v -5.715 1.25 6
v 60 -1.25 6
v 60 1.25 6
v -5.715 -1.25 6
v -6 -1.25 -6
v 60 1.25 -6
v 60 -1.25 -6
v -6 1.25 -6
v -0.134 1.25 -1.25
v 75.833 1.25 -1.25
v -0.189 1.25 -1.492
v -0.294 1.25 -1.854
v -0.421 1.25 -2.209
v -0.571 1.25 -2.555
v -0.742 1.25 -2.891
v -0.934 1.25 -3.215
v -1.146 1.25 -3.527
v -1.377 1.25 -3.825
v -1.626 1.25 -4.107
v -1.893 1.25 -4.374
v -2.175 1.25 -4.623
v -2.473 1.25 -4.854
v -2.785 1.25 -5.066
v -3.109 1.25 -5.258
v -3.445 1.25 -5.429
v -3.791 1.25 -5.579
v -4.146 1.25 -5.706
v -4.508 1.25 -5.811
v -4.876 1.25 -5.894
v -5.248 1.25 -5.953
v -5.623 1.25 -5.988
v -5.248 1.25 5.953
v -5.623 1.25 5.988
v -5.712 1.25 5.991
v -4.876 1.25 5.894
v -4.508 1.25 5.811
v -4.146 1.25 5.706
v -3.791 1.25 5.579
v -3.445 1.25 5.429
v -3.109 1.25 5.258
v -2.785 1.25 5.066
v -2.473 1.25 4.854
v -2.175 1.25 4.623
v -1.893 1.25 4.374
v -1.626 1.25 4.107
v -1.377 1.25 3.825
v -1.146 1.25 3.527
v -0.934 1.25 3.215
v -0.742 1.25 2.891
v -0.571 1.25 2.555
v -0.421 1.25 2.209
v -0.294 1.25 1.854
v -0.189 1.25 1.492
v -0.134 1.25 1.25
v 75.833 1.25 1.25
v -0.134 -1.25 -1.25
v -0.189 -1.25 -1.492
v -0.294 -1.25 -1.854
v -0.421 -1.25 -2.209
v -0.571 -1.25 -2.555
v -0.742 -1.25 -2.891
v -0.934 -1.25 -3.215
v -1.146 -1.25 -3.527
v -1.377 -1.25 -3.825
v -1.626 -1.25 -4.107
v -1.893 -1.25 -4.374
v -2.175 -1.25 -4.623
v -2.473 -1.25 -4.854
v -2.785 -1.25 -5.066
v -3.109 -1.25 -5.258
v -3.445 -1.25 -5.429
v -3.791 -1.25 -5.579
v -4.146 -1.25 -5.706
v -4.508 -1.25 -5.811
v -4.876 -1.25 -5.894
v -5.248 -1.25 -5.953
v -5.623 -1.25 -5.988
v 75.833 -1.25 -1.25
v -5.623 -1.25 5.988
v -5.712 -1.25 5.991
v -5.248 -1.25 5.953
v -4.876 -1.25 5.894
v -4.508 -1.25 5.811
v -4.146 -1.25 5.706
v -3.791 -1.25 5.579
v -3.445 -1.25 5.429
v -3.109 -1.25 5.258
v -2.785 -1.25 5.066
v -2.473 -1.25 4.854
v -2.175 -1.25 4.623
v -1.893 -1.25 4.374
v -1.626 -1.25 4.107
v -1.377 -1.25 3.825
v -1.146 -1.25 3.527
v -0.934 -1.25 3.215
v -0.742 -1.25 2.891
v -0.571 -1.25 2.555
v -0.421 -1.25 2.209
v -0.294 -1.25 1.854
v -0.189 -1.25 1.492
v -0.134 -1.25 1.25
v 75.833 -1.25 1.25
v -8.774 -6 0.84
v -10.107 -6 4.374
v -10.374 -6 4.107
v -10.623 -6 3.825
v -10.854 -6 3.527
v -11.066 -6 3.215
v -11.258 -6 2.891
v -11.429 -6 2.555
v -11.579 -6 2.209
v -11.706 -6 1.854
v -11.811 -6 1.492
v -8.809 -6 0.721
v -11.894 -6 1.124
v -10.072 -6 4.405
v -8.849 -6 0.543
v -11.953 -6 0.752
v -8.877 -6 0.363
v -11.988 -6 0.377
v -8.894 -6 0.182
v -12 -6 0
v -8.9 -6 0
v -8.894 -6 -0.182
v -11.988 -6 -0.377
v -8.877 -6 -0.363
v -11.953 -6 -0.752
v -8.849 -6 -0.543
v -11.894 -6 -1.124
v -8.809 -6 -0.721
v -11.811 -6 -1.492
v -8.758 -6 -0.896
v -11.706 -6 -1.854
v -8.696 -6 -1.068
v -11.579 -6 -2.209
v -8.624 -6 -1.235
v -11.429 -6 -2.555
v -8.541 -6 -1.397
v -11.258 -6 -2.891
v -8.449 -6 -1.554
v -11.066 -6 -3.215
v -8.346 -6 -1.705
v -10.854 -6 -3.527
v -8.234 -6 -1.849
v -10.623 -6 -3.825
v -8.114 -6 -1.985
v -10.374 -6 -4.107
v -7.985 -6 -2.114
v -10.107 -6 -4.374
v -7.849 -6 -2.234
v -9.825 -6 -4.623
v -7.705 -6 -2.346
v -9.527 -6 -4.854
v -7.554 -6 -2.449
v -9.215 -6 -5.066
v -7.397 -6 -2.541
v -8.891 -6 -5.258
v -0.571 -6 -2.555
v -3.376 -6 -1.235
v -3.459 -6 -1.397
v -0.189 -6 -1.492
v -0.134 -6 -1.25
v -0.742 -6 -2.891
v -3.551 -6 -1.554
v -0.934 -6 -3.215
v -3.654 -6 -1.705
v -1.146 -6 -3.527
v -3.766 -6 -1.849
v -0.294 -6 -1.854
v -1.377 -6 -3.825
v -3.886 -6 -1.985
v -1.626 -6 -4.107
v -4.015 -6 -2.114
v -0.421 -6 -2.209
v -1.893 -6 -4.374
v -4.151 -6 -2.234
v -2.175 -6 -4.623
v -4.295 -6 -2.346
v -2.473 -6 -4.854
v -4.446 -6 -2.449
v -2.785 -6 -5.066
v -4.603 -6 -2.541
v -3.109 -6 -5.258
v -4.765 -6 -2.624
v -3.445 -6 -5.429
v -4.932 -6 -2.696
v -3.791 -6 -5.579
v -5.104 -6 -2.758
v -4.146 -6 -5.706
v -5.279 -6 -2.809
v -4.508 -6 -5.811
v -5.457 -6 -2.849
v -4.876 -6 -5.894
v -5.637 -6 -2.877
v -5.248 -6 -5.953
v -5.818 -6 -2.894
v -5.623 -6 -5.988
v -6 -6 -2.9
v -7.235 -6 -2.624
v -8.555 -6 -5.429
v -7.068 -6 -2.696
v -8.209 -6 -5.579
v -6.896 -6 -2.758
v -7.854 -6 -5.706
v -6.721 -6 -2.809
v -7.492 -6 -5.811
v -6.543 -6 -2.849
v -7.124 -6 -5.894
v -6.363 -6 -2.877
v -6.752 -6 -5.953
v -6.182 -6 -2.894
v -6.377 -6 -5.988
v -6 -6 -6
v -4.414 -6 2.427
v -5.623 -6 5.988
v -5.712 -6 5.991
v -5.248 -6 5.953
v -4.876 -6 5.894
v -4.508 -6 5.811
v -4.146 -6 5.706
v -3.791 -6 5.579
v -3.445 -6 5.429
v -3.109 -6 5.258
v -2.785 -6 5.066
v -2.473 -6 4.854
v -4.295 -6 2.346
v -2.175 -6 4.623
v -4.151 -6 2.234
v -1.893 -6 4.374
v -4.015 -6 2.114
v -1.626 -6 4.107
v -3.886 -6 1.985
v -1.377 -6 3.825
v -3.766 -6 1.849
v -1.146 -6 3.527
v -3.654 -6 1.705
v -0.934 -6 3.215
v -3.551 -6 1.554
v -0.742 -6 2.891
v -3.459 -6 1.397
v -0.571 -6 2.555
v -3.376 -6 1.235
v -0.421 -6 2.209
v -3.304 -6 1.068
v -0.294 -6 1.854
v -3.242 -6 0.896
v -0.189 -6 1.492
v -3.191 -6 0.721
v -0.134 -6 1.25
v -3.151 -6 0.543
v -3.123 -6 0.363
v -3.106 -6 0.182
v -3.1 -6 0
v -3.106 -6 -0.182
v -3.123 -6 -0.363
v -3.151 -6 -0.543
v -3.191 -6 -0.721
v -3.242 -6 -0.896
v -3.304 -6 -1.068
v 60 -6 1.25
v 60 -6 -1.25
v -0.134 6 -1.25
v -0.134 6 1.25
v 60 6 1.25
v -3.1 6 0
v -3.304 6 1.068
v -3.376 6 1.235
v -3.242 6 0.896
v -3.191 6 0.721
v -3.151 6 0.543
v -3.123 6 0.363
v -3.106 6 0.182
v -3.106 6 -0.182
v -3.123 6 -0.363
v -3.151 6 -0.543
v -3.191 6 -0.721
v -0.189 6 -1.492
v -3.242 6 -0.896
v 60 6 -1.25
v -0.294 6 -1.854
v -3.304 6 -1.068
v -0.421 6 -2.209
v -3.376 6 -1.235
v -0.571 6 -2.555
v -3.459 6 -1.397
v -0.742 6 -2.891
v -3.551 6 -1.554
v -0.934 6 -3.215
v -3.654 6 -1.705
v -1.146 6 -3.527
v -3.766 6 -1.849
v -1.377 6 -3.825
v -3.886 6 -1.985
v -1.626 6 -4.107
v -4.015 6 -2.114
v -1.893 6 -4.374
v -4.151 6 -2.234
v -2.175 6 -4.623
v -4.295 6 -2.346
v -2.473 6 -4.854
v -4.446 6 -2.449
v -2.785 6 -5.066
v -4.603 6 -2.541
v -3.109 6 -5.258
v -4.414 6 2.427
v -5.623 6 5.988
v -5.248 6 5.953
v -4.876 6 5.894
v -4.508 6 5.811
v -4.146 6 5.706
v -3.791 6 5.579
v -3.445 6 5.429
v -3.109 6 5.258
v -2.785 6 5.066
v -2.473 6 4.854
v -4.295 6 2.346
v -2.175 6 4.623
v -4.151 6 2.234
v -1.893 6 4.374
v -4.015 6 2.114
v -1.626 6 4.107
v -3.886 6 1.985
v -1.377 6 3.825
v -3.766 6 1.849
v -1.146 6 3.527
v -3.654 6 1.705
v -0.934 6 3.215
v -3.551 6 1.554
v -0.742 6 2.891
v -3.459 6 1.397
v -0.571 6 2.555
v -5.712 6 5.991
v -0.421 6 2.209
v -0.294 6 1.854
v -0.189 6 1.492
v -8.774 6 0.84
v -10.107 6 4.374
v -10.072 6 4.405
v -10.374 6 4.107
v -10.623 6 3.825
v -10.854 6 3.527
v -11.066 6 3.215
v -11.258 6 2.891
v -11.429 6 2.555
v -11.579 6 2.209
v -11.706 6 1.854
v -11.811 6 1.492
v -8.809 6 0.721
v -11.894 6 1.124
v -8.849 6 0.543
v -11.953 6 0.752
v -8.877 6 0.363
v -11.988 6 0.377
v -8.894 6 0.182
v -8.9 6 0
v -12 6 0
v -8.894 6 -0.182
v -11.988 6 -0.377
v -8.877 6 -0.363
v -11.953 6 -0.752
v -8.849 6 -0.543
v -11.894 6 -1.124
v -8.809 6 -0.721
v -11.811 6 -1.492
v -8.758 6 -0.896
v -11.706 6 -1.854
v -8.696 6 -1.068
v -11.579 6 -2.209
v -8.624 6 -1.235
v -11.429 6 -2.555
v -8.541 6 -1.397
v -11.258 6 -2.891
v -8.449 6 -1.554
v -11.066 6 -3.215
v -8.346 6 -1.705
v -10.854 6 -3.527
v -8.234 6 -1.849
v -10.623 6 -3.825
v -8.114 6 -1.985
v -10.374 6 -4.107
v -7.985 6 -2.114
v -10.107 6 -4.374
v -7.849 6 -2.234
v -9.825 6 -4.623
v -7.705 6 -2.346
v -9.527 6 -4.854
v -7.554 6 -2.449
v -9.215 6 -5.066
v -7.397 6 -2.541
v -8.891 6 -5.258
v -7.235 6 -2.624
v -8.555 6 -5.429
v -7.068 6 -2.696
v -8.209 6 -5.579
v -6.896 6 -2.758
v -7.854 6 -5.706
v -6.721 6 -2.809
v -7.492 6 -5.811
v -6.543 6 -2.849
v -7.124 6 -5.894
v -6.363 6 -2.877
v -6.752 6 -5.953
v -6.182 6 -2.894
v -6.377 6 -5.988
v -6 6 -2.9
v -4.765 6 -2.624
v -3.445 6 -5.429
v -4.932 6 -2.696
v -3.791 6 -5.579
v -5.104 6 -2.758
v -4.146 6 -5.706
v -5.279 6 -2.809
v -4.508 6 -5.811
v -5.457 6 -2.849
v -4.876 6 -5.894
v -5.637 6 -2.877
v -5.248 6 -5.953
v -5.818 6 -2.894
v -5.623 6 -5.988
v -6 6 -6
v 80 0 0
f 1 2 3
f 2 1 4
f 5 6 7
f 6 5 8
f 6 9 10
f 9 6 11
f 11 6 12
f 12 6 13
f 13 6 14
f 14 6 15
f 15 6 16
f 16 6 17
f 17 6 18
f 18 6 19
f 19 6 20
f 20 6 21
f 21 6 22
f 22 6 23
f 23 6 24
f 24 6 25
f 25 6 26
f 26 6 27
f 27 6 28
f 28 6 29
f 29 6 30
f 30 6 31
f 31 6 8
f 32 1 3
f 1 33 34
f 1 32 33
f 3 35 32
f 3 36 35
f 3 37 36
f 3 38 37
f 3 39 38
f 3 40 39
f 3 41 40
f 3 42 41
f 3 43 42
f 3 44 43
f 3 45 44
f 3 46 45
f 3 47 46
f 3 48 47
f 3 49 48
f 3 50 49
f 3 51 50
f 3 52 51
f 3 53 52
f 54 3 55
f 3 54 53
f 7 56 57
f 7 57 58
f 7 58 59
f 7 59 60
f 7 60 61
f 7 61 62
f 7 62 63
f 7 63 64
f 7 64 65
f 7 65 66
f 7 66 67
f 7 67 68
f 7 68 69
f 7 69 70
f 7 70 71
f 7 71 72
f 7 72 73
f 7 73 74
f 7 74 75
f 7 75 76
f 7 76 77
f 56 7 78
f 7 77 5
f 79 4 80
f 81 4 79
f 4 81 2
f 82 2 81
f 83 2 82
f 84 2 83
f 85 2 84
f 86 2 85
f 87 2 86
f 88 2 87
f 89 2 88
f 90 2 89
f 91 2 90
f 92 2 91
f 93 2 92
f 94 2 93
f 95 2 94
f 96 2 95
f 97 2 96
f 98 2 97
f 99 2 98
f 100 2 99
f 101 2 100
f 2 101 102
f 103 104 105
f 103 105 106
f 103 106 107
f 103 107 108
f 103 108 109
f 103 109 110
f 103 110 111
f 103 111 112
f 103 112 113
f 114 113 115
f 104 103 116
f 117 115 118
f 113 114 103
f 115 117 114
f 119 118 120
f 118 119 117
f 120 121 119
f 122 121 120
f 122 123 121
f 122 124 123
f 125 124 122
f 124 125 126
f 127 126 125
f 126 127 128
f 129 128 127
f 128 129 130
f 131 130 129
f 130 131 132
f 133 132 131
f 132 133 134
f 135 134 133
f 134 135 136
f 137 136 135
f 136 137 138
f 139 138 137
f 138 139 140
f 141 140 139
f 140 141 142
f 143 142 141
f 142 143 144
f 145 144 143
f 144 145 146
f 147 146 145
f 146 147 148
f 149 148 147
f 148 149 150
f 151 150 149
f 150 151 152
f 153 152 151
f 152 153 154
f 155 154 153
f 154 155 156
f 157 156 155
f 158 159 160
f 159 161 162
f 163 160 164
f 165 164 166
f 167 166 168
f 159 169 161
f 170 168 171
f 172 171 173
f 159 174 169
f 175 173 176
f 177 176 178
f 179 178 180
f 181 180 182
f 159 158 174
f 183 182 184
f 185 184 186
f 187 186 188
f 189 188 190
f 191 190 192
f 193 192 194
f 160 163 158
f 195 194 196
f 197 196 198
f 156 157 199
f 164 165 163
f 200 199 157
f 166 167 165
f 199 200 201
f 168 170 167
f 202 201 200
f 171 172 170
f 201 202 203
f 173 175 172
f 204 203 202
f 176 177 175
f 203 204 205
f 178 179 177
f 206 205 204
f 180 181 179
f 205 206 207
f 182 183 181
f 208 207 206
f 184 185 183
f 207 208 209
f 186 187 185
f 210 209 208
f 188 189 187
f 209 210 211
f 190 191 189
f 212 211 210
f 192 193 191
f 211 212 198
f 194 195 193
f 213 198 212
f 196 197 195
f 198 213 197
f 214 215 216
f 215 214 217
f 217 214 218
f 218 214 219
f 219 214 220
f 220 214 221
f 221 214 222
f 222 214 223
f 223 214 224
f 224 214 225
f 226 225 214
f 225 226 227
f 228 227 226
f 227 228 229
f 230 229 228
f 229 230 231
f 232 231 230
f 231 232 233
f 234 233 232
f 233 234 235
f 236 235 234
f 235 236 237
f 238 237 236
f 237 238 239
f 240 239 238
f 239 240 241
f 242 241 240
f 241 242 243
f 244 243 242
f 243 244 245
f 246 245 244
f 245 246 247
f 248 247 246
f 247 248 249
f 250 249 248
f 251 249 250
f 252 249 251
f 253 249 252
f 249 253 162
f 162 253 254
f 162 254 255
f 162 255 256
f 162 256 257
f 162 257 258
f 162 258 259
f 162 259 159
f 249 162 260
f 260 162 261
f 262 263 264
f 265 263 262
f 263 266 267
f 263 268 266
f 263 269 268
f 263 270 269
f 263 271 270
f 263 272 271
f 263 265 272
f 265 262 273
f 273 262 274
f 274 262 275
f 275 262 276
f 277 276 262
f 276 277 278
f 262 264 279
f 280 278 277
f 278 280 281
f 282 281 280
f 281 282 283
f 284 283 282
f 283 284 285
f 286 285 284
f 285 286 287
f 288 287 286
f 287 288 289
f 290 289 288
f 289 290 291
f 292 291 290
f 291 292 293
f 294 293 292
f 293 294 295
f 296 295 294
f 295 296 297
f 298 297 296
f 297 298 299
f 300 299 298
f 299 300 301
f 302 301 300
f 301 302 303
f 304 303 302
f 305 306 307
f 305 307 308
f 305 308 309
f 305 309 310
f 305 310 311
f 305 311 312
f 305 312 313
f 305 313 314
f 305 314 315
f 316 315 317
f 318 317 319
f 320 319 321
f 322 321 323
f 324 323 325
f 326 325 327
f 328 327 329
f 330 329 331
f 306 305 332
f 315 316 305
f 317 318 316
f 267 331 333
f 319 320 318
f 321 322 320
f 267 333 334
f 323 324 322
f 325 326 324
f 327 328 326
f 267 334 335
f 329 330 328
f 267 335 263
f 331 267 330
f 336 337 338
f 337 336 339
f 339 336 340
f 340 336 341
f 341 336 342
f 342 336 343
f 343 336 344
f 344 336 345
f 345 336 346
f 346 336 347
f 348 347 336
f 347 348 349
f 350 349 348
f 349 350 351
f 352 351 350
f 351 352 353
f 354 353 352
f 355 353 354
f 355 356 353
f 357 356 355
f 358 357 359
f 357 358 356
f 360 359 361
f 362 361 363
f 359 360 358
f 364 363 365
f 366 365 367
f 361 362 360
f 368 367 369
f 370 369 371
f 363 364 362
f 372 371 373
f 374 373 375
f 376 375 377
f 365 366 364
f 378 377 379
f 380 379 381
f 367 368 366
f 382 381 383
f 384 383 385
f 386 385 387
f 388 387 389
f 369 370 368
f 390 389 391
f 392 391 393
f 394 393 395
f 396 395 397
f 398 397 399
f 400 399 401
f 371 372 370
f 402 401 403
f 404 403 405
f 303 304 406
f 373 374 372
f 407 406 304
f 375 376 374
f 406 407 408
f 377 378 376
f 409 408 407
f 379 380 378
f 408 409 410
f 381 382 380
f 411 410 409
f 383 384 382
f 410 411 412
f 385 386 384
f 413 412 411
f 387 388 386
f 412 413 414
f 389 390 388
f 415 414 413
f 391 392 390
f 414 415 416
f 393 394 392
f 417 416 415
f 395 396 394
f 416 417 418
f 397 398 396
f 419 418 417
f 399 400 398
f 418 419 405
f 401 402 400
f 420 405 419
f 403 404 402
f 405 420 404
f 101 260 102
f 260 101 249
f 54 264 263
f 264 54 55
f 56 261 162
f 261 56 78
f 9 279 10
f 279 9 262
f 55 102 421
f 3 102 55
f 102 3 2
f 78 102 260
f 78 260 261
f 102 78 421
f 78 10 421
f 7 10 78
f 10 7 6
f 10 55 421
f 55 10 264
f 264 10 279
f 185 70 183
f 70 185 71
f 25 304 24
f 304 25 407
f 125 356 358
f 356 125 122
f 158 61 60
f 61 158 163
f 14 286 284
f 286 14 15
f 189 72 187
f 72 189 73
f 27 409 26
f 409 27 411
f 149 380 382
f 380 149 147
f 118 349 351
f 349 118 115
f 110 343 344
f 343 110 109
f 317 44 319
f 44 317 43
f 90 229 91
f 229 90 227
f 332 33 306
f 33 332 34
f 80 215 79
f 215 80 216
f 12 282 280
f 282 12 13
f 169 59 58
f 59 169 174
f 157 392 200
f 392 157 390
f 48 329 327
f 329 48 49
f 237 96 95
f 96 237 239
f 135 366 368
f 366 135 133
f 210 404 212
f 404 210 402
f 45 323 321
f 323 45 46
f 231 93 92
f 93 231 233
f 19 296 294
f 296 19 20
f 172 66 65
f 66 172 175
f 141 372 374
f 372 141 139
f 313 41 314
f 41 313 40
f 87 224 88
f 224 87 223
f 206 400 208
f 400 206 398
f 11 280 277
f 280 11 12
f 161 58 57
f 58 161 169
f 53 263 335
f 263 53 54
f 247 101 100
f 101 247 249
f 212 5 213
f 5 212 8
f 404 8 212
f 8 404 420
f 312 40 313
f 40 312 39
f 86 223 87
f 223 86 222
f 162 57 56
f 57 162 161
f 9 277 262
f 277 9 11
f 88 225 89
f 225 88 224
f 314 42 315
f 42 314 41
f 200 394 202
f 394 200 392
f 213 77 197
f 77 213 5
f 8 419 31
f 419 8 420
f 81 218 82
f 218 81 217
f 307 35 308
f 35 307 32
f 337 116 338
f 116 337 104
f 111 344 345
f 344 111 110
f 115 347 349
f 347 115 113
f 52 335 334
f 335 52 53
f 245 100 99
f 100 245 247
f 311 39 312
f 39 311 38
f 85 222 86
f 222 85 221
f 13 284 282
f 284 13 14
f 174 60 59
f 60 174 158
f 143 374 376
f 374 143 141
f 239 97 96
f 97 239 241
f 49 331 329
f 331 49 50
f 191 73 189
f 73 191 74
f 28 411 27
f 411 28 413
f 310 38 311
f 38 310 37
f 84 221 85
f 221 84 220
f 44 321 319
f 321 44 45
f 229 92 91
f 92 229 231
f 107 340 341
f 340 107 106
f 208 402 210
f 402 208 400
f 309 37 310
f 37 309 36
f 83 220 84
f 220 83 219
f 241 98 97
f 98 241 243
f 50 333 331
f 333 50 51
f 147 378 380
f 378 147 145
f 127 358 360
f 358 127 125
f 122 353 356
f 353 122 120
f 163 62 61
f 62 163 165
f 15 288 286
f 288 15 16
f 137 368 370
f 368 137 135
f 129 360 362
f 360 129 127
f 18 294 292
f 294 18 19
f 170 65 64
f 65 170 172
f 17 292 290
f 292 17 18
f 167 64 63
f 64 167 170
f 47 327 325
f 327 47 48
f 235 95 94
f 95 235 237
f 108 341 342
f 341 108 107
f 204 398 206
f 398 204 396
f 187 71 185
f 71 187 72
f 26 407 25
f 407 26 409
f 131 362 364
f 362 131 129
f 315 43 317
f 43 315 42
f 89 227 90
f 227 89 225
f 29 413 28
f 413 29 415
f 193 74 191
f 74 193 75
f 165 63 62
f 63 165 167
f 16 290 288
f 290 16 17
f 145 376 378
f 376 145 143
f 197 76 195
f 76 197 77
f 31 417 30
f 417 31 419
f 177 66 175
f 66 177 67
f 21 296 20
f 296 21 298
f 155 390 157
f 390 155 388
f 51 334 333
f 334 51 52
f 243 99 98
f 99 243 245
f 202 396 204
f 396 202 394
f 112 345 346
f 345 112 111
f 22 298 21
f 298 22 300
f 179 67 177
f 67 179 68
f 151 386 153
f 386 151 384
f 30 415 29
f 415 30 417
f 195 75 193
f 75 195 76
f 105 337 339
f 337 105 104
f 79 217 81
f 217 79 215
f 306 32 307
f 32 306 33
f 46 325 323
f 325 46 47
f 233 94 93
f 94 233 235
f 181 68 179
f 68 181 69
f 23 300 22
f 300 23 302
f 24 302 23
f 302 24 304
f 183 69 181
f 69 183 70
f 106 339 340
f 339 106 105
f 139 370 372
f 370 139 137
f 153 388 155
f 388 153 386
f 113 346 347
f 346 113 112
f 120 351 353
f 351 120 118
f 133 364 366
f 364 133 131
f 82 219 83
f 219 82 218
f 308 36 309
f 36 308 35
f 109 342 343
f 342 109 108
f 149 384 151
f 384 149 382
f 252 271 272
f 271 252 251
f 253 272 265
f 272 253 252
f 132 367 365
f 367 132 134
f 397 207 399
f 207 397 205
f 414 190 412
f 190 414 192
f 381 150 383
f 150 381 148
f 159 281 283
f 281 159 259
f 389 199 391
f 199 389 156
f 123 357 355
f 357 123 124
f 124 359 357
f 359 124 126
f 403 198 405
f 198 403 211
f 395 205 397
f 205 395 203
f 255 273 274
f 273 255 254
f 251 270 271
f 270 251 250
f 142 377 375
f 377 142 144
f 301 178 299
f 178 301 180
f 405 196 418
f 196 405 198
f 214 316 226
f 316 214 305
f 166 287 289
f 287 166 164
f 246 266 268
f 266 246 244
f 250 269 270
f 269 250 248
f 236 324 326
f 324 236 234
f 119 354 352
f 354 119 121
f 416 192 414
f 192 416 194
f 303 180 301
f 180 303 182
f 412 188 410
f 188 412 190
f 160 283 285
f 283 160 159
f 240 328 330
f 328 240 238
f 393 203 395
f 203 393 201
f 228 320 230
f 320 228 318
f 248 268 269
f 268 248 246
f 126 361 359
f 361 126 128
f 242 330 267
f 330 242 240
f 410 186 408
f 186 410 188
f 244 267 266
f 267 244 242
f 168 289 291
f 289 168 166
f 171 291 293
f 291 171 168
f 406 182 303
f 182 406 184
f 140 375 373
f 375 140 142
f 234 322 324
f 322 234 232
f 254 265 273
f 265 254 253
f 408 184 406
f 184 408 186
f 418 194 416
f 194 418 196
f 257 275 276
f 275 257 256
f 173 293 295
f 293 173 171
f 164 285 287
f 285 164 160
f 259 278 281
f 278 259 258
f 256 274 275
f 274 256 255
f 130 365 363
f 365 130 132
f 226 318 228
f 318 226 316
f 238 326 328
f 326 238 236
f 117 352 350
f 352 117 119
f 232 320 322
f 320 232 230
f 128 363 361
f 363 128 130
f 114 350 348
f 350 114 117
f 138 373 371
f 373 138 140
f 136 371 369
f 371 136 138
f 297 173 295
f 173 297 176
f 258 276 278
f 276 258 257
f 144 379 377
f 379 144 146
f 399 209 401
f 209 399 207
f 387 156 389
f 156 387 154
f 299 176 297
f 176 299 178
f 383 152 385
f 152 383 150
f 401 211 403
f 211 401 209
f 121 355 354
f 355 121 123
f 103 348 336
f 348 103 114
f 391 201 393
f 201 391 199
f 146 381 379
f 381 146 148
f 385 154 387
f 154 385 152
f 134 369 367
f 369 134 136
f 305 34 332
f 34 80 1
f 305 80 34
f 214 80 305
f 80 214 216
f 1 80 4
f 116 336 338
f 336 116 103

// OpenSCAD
//
//  HoseClip.scad
//  flower-box-hose-system
//
//  Author: Marius Montebaur
//  montebaur.tech, github.com/montioo
//

// set this to a lower value (e.g. 30) while editing.
$fn = 100;


// A tip or spike to stick into soil. Coordinate origin is the top part.
// @param overhang: How far the spike should extend over the coordinate origin.
// @param stick_dia: Diameter of the stick.
module Spike(overhang=20, stick_dia=12) {
    bar_thickness = 2.5;
    spire_length = 20;
    stick_length = 80;

    difference() {
        for (i = [0, 1]) {
            rotate([i*90, 0, 0]) translate([-overhang, -bar_thickness/2, -stick_dia/2])
                cube([stick_length+overhang, bar_thickness, stick_dia]);
        }

        t = 1;  // parameter for polygon generation
        for (i = [0 : 3]) {
            rotate([i*90, 0, 0]) translate([stick_length, 0, stick_dia/2])
                rotate([90, 180, 0]) translate([0, 0, -bar_thickness/2 - 0.01])
                linear_extrude(height=bar_thickness+0.02)
                polygon([[-t, -t], [-t, stick_dia/2], [0, stick_dia/2], [spire_length, 0], [spire_length, -t]]);
        }
    }
}

// Models a hose clip
// @param head_width: Width of the upper part that clips to the hose.
// @param inner_diameter: inner diameters of the clip. Should be a bit less than the hose's diameter.
module HoseClip(head_width, inner_diameter) {
    outer_diameter = max(12, inner_diameter + 2*3);
    holder_opening = inner_diameter * 0.8;

    difference() {
        union() {
            Spike(overhang=outer_diameter/2, stick_dia=head_width);
            translate([-outer_diameter/2, head_width/2, 0]) rotate([90, 0, 0]) cylinder(h=head_width, d=outer_diameter);
        }

        translate([-outer_diameter/2, head_width/2, 0]) rotate([90, 0, 0]) {
            translate([0, 0, -1]) cylinder(h=head_width + 2, d=inner_diameter);

            rotate([0, 0, 20]) translate([-holder_opening/2, 0, -1]) cube([holder_opening, outer_diameter, head_width + 2]);
        }
    }
}

// Parameterization for a 8mm x 1.5mm hose => 11mm diameter
module HoseClip8mm() {
    head_width = 12;
    inner_diameter = 10.8;  // hose has an outer diameter of 11mm
    
    HoseClip(head_width=head_width, inner_diameter=inner_diameter);
}

// Parameterization for a 4mm x 1mm hose => 6mm diameter
module HoseClip4mm() {
    head_width = 12;
    inner_diameter = 5.8;
    
    HoseClip(head_width=head_width, inner_diameter=inner_diameter);
}

// Custom clip
// module HoseClipXmm(hose_type=0) {
//     Add the diameter of your hose here:
//     hose_outer_diameter = ...;
//     head_width = 12;
//     inner_diameter = hose_outer_diameter - 0.2;
//     
//     HoseClip(head_width=head_width, inner_diameter=inner_diameter);
// }


HoseClip4mm();
